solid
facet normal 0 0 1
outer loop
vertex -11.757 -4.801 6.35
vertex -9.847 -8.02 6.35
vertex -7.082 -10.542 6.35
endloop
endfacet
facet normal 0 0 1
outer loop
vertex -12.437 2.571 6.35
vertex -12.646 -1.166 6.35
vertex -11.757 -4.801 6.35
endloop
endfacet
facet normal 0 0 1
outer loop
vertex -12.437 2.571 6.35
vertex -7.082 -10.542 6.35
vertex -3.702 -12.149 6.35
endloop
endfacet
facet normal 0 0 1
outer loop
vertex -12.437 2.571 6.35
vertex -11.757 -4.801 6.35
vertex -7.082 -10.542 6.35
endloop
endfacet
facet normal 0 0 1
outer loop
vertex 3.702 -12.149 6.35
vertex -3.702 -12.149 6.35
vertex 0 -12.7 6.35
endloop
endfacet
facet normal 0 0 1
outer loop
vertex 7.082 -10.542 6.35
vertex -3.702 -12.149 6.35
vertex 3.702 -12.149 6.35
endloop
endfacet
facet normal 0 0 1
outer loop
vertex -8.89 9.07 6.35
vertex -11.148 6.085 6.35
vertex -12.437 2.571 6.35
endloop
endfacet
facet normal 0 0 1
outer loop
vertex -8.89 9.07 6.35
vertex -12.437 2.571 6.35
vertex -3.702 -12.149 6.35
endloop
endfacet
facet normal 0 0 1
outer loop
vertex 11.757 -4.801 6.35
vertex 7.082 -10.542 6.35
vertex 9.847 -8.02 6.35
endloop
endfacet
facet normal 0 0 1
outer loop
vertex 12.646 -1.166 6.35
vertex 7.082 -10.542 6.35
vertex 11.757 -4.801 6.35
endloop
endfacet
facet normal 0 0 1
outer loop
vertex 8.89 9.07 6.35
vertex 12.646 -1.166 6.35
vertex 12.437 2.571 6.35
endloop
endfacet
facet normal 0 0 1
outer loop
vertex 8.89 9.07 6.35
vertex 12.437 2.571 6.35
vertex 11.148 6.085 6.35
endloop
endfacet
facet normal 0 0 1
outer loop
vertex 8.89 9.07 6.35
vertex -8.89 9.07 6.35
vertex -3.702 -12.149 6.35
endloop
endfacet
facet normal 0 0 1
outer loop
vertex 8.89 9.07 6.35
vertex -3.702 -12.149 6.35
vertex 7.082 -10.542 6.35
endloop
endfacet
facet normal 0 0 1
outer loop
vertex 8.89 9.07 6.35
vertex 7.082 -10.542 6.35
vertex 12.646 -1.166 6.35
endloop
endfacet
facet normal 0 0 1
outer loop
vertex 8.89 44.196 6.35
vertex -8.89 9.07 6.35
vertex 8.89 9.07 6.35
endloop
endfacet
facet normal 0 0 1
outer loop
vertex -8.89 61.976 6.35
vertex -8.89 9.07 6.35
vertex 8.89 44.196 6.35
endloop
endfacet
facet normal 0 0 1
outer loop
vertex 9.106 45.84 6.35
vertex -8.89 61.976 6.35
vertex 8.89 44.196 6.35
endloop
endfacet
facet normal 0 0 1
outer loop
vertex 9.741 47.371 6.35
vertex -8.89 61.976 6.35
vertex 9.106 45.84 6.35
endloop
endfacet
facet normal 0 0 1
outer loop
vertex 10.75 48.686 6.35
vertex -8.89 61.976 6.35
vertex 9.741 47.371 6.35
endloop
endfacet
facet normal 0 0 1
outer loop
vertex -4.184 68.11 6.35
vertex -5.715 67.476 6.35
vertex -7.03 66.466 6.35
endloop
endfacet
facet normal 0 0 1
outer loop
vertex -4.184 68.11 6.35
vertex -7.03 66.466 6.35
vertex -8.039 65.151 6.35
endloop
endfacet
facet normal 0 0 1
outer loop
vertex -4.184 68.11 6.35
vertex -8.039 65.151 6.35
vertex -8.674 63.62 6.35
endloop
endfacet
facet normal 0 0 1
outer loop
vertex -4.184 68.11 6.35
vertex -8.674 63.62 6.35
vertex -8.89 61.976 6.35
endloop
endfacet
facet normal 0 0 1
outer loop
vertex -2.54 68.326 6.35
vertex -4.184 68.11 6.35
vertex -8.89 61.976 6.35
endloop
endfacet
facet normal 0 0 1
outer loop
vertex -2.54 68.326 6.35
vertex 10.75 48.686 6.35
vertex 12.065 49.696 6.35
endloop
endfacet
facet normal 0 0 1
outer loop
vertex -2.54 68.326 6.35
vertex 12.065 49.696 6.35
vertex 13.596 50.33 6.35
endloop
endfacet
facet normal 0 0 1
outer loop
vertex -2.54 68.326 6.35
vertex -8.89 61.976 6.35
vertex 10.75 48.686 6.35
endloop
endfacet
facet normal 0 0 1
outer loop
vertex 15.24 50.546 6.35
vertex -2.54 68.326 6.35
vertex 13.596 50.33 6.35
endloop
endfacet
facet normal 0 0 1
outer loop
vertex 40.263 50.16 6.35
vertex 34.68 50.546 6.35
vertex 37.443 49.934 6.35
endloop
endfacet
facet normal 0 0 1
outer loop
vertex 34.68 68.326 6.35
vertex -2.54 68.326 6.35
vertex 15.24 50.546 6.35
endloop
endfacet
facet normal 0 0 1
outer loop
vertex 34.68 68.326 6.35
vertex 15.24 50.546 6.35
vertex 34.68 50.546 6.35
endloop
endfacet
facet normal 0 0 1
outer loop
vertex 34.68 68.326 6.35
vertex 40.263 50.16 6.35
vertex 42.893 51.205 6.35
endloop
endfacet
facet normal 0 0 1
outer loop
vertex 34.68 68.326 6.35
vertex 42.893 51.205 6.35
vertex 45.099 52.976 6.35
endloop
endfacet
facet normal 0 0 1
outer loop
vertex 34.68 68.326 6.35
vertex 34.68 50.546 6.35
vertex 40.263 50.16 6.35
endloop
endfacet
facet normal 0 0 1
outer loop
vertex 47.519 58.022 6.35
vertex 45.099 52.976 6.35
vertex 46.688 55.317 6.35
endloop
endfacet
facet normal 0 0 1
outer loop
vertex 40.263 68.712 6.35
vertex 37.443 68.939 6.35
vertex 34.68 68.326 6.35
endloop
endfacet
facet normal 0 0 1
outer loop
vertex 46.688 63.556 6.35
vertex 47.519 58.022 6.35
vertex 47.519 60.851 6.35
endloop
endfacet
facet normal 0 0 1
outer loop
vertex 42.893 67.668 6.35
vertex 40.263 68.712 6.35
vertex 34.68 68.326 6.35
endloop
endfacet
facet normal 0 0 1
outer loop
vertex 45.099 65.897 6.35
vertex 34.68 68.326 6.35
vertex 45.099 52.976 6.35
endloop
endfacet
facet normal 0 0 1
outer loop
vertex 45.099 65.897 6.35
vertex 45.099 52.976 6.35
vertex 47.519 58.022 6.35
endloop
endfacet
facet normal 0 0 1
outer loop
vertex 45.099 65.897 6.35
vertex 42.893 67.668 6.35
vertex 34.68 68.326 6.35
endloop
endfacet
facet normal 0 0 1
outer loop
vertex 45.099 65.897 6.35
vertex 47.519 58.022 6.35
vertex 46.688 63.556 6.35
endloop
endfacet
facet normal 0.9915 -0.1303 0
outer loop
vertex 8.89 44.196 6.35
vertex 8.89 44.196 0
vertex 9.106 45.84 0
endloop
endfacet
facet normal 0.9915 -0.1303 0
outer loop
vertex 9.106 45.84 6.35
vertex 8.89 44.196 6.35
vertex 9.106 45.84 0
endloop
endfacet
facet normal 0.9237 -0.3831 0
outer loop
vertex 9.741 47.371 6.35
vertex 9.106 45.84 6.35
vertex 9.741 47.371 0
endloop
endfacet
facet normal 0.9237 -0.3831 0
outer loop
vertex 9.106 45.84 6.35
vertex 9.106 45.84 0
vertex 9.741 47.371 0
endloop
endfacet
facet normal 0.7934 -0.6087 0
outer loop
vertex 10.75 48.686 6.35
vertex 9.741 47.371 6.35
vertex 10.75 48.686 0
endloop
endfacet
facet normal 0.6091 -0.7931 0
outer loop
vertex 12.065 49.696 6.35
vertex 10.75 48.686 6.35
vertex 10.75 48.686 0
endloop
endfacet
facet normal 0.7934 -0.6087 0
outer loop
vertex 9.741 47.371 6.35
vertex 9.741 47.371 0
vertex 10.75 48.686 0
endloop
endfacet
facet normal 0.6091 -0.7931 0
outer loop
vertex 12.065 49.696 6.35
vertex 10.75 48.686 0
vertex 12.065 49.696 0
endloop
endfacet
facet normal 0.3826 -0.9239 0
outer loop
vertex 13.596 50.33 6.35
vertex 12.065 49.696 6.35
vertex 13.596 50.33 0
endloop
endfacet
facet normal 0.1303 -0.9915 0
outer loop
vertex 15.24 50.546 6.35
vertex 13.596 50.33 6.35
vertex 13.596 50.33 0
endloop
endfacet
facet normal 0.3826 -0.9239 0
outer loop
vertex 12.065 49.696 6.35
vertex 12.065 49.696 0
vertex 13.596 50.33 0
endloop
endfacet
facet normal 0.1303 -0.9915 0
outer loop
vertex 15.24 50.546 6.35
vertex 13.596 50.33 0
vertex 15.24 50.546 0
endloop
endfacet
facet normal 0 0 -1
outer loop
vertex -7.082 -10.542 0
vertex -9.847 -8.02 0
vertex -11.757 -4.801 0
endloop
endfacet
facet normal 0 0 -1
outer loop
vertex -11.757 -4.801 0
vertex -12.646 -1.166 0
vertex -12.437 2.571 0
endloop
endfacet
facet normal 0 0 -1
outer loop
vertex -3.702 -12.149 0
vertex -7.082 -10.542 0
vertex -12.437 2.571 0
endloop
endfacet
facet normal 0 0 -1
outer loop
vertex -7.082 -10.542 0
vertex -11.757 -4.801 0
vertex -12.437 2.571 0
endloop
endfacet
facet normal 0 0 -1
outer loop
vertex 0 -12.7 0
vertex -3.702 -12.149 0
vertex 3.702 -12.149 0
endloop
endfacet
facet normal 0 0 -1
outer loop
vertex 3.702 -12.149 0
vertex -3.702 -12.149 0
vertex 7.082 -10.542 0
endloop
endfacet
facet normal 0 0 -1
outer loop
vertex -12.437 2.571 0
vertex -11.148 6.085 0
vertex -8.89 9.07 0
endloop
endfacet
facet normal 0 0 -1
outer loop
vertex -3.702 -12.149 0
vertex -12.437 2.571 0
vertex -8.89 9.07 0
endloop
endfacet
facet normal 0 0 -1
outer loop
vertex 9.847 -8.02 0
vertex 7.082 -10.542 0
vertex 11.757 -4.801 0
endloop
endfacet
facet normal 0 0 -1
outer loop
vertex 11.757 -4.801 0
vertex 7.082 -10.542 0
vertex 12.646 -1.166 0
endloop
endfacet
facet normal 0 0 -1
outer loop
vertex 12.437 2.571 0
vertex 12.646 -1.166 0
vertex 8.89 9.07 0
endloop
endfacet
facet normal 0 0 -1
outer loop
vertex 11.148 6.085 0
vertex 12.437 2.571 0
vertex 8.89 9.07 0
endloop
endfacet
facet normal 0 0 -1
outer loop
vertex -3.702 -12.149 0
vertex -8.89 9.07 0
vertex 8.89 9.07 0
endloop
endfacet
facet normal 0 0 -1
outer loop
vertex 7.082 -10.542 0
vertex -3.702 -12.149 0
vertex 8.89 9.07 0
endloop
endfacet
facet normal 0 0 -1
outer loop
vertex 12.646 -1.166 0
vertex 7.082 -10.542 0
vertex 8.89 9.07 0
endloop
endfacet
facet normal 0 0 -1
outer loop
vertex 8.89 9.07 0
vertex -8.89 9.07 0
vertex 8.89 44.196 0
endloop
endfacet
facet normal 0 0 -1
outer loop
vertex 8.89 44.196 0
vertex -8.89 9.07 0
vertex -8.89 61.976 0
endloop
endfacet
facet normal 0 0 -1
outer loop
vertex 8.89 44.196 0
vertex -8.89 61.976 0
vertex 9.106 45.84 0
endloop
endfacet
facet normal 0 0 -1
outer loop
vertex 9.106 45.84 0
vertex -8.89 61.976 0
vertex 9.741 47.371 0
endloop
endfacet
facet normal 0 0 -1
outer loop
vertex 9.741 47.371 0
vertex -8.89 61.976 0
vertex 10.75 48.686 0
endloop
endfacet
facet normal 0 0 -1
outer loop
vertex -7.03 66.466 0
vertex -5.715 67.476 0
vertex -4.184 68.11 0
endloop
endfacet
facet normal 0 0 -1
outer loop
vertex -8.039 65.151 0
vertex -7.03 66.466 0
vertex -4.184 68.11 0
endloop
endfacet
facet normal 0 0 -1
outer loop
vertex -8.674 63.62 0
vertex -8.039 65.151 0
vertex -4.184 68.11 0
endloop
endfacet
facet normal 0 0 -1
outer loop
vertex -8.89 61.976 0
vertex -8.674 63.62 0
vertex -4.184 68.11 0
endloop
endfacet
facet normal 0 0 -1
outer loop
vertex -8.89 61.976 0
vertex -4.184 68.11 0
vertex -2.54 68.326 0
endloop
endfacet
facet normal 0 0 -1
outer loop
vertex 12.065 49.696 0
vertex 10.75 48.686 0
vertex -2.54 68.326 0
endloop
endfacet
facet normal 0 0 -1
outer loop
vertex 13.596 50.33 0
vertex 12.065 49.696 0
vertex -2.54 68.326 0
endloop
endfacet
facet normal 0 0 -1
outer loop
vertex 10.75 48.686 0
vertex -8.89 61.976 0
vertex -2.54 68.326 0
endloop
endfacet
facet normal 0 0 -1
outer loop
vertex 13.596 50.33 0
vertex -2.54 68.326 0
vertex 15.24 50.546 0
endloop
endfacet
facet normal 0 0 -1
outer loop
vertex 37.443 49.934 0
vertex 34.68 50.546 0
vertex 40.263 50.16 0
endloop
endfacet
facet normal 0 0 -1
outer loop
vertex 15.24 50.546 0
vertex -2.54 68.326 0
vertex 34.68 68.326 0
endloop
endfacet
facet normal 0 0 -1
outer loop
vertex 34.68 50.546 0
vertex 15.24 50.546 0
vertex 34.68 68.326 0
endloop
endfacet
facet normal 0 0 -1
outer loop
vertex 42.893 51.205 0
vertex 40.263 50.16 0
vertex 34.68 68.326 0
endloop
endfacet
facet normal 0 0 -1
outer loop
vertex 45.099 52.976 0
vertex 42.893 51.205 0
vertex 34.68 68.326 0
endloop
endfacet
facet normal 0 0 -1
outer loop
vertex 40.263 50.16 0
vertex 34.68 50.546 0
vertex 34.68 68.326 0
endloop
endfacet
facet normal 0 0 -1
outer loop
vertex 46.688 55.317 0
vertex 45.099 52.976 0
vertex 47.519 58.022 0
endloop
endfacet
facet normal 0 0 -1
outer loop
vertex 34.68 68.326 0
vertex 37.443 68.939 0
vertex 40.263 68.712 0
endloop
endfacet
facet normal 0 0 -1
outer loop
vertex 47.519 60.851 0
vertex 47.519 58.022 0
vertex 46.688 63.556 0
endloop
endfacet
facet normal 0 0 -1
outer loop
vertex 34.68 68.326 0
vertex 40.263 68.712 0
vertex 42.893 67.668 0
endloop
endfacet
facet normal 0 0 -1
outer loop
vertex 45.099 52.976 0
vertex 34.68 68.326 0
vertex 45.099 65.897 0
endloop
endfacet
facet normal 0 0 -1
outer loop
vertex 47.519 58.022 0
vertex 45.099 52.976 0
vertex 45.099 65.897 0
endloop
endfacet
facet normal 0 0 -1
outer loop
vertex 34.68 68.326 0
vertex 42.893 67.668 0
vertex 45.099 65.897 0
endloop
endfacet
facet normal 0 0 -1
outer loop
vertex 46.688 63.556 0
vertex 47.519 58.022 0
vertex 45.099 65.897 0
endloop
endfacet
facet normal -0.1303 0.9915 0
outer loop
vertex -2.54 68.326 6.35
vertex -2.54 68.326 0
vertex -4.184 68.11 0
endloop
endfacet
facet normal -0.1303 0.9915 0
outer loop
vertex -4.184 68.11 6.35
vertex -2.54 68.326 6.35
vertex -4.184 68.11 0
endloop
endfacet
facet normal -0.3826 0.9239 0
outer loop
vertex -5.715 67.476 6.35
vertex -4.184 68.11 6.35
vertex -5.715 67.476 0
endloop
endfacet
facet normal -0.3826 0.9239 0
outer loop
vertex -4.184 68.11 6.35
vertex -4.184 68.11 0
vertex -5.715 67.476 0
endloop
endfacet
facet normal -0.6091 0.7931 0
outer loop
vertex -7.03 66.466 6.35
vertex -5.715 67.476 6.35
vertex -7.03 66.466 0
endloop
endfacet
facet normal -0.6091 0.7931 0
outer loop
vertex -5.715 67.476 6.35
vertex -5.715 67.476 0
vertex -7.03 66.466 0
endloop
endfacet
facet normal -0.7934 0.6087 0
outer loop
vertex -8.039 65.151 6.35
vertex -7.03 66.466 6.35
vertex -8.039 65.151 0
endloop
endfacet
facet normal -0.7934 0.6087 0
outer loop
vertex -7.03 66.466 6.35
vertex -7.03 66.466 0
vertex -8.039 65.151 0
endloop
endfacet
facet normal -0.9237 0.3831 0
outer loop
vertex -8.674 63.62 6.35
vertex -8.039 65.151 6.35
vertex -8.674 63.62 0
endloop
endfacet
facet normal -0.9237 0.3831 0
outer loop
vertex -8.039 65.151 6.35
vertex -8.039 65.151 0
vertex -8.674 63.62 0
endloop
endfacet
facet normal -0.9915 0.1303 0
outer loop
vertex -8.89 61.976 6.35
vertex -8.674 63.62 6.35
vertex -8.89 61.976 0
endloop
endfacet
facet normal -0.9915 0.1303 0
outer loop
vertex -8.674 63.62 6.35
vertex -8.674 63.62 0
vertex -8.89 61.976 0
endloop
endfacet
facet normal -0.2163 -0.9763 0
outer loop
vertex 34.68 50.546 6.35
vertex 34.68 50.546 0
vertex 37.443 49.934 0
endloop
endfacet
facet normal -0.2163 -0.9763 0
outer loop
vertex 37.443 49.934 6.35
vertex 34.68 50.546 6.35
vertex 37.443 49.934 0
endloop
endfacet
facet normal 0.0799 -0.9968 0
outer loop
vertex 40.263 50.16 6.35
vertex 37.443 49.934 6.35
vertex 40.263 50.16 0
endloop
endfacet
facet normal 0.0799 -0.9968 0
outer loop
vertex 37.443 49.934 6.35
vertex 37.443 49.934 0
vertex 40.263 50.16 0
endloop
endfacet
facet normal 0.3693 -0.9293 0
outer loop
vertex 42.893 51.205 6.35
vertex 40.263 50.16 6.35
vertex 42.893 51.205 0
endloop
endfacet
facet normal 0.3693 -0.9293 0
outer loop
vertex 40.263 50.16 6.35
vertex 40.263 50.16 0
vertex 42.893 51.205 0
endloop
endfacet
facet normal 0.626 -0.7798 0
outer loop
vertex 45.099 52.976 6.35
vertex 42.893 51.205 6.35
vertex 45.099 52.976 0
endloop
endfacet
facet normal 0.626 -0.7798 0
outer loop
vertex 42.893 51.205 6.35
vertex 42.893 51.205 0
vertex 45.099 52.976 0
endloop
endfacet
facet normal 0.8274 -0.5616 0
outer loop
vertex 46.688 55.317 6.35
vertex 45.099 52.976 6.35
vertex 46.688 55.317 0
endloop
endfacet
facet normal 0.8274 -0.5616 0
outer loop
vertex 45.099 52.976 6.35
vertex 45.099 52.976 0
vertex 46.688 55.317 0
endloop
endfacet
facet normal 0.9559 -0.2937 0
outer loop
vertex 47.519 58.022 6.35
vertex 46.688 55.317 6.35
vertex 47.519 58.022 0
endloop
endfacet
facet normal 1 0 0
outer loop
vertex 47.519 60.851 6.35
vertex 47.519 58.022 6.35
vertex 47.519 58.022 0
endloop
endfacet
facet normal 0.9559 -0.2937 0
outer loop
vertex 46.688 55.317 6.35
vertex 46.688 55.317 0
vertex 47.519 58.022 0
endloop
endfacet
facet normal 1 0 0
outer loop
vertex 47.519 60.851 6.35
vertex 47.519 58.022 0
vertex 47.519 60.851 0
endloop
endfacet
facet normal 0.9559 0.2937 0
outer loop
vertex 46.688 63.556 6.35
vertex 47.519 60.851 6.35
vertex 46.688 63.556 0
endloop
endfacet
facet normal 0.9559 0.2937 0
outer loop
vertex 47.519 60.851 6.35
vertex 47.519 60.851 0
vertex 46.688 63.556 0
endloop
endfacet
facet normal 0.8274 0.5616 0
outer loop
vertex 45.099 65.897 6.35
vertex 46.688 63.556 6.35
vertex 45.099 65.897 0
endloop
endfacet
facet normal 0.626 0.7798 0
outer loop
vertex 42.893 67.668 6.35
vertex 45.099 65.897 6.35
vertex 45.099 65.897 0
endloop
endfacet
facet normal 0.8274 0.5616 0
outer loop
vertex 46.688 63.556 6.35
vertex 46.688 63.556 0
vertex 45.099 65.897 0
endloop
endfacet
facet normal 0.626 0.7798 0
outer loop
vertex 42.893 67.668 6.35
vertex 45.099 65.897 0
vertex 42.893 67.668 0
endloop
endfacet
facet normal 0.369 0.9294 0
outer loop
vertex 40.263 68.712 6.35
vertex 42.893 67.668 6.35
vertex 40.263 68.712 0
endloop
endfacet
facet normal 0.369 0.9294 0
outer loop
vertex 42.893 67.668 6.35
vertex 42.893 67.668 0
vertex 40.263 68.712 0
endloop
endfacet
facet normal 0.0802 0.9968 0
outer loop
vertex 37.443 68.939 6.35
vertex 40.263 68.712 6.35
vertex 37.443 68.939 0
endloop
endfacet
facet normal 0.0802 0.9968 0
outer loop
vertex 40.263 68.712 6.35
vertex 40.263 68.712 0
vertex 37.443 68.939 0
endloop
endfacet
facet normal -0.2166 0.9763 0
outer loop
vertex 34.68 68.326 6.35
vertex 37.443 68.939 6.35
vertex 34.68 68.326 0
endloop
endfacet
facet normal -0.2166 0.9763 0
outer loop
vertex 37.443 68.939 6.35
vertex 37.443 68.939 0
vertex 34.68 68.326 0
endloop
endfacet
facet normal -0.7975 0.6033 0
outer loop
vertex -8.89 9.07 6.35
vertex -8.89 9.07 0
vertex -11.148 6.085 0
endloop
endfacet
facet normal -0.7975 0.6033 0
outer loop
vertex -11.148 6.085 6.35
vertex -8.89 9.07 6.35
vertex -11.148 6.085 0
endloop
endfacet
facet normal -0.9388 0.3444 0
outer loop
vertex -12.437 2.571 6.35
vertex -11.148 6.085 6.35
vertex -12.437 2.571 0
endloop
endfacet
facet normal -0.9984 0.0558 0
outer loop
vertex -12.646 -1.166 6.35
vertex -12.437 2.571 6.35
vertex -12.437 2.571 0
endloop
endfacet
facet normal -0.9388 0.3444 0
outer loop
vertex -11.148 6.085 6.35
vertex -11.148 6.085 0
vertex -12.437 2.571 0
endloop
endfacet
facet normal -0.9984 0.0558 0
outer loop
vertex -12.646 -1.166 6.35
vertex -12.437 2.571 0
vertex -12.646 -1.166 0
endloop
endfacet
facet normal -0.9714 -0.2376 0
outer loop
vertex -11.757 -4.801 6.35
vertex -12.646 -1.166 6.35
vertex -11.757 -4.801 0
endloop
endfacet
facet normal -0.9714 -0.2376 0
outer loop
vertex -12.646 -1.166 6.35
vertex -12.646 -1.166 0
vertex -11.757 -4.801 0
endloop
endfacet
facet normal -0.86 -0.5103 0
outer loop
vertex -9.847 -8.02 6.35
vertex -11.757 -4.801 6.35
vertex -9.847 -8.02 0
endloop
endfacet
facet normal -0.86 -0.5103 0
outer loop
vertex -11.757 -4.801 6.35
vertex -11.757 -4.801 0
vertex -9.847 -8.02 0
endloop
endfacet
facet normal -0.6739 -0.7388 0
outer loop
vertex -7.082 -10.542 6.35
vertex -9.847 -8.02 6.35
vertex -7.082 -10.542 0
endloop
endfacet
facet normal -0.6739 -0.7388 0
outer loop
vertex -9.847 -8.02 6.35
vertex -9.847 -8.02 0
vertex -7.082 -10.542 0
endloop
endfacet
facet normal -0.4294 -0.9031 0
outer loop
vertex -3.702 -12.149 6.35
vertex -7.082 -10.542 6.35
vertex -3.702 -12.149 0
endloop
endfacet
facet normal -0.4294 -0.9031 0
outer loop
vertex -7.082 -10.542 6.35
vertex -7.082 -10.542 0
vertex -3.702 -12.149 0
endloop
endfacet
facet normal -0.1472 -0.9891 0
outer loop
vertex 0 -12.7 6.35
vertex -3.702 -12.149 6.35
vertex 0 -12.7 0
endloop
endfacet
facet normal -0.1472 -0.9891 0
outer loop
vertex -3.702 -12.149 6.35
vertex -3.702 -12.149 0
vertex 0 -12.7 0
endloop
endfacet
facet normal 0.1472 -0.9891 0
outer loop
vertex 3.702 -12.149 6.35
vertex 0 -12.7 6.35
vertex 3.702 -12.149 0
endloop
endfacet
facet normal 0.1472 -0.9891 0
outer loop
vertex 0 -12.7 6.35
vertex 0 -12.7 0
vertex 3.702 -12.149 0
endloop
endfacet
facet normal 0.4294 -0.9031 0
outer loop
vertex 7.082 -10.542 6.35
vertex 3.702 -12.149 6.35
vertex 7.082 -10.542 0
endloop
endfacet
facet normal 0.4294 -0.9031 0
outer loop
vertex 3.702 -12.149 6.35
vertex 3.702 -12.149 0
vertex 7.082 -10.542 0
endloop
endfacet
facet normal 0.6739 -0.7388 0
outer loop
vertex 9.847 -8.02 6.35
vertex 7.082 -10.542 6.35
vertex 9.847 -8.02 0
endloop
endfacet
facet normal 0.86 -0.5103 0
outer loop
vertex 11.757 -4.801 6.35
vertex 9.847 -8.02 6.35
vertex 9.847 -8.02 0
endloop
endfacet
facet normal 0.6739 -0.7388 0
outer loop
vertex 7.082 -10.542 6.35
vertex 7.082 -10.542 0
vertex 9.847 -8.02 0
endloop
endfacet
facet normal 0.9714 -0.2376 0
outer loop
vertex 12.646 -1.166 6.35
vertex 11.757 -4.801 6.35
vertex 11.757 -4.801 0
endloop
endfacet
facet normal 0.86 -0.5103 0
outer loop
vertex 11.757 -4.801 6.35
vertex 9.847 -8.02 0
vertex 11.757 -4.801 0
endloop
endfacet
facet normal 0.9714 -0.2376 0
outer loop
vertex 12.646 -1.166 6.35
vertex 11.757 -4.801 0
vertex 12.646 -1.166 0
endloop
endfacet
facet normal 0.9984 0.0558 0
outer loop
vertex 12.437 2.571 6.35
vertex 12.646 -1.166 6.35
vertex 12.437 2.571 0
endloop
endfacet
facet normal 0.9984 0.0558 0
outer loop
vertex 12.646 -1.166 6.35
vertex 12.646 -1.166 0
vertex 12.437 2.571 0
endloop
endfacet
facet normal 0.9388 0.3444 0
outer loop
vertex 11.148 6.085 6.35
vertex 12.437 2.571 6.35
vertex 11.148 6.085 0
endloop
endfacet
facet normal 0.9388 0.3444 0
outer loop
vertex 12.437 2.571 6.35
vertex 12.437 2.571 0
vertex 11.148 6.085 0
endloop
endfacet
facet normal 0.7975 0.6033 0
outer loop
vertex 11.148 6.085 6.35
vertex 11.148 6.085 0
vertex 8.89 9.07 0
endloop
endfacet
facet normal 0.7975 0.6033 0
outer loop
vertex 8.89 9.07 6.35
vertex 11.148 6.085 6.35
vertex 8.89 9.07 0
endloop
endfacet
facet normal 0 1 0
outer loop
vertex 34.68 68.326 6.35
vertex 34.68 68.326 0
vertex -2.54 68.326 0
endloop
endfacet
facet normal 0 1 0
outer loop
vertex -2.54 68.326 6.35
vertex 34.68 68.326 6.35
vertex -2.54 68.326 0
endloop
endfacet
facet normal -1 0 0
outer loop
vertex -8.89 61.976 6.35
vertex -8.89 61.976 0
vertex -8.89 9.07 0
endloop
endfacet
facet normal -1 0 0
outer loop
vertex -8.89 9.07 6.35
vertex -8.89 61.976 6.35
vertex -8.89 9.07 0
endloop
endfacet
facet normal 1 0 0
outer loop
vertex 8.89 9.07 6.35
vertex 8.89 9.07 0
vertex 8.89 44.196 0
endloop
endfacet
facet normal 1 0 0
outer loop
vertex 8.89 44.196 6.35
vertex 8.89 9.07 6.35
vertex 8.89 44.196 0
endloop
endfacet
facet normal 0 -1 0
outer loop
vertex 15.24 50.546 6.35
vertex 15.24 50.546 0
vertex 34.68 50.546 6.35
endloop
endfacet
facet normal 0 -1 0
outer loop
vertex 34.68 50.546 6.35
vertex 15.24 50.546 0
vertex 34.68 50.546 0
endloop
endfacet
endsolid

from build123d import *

# Parameters (mm, degrees)
F1_DEPTH = 6.35


with BuildPart() as f1:
    # F0 (on Top) → F1 (new body)
    with BuildSketch(Plane.XY):
        with BuildLine():
            ThreePointArc((0, 12.7), (-4.801349, 11.757425), (-8.89, 9.069614))
            ThreePointArc((-8.89, 9.069614), (0, -12.7), (8.89, 9.069614))
            ThreePointArc((8.89, 9.069614), (4.801349, 11.757425), (0, 12.7))
        make_face()
        with BuildLine():
            Line((-8.89, 61.97625), (-8.89, 9.069614))
            ThreePointArc((-8.89, 9.069614), (-4.801349, 11.757425), (0, 12.7))
            ThreePointArc((0, 12.7), (4.801349, 11.757425), (8.89, 9.069614))
            Line((8.89, 9.069614), (8.89, 44.19625))
            ThreePointArc((8.89, 44.19625), (10.749872, 48.686378), (15.24, 50.54625))
            Line((15.24, 50.54625), (34.68042, 50.54625))
            ThreePointArc((34.68042, 50.54625), (47.625, 59.43625), (34.68042, 68.32625))
            Line((34.68042, 68.32625), (-2.54, 68.32625))
            ThreePointArc((-2.54, 68.32625), (-7.030128, 66.466378), (-8.89, 61.97625))
        make_face()
    extrude(amount=F1_DEPTH)


solid = f1.part
